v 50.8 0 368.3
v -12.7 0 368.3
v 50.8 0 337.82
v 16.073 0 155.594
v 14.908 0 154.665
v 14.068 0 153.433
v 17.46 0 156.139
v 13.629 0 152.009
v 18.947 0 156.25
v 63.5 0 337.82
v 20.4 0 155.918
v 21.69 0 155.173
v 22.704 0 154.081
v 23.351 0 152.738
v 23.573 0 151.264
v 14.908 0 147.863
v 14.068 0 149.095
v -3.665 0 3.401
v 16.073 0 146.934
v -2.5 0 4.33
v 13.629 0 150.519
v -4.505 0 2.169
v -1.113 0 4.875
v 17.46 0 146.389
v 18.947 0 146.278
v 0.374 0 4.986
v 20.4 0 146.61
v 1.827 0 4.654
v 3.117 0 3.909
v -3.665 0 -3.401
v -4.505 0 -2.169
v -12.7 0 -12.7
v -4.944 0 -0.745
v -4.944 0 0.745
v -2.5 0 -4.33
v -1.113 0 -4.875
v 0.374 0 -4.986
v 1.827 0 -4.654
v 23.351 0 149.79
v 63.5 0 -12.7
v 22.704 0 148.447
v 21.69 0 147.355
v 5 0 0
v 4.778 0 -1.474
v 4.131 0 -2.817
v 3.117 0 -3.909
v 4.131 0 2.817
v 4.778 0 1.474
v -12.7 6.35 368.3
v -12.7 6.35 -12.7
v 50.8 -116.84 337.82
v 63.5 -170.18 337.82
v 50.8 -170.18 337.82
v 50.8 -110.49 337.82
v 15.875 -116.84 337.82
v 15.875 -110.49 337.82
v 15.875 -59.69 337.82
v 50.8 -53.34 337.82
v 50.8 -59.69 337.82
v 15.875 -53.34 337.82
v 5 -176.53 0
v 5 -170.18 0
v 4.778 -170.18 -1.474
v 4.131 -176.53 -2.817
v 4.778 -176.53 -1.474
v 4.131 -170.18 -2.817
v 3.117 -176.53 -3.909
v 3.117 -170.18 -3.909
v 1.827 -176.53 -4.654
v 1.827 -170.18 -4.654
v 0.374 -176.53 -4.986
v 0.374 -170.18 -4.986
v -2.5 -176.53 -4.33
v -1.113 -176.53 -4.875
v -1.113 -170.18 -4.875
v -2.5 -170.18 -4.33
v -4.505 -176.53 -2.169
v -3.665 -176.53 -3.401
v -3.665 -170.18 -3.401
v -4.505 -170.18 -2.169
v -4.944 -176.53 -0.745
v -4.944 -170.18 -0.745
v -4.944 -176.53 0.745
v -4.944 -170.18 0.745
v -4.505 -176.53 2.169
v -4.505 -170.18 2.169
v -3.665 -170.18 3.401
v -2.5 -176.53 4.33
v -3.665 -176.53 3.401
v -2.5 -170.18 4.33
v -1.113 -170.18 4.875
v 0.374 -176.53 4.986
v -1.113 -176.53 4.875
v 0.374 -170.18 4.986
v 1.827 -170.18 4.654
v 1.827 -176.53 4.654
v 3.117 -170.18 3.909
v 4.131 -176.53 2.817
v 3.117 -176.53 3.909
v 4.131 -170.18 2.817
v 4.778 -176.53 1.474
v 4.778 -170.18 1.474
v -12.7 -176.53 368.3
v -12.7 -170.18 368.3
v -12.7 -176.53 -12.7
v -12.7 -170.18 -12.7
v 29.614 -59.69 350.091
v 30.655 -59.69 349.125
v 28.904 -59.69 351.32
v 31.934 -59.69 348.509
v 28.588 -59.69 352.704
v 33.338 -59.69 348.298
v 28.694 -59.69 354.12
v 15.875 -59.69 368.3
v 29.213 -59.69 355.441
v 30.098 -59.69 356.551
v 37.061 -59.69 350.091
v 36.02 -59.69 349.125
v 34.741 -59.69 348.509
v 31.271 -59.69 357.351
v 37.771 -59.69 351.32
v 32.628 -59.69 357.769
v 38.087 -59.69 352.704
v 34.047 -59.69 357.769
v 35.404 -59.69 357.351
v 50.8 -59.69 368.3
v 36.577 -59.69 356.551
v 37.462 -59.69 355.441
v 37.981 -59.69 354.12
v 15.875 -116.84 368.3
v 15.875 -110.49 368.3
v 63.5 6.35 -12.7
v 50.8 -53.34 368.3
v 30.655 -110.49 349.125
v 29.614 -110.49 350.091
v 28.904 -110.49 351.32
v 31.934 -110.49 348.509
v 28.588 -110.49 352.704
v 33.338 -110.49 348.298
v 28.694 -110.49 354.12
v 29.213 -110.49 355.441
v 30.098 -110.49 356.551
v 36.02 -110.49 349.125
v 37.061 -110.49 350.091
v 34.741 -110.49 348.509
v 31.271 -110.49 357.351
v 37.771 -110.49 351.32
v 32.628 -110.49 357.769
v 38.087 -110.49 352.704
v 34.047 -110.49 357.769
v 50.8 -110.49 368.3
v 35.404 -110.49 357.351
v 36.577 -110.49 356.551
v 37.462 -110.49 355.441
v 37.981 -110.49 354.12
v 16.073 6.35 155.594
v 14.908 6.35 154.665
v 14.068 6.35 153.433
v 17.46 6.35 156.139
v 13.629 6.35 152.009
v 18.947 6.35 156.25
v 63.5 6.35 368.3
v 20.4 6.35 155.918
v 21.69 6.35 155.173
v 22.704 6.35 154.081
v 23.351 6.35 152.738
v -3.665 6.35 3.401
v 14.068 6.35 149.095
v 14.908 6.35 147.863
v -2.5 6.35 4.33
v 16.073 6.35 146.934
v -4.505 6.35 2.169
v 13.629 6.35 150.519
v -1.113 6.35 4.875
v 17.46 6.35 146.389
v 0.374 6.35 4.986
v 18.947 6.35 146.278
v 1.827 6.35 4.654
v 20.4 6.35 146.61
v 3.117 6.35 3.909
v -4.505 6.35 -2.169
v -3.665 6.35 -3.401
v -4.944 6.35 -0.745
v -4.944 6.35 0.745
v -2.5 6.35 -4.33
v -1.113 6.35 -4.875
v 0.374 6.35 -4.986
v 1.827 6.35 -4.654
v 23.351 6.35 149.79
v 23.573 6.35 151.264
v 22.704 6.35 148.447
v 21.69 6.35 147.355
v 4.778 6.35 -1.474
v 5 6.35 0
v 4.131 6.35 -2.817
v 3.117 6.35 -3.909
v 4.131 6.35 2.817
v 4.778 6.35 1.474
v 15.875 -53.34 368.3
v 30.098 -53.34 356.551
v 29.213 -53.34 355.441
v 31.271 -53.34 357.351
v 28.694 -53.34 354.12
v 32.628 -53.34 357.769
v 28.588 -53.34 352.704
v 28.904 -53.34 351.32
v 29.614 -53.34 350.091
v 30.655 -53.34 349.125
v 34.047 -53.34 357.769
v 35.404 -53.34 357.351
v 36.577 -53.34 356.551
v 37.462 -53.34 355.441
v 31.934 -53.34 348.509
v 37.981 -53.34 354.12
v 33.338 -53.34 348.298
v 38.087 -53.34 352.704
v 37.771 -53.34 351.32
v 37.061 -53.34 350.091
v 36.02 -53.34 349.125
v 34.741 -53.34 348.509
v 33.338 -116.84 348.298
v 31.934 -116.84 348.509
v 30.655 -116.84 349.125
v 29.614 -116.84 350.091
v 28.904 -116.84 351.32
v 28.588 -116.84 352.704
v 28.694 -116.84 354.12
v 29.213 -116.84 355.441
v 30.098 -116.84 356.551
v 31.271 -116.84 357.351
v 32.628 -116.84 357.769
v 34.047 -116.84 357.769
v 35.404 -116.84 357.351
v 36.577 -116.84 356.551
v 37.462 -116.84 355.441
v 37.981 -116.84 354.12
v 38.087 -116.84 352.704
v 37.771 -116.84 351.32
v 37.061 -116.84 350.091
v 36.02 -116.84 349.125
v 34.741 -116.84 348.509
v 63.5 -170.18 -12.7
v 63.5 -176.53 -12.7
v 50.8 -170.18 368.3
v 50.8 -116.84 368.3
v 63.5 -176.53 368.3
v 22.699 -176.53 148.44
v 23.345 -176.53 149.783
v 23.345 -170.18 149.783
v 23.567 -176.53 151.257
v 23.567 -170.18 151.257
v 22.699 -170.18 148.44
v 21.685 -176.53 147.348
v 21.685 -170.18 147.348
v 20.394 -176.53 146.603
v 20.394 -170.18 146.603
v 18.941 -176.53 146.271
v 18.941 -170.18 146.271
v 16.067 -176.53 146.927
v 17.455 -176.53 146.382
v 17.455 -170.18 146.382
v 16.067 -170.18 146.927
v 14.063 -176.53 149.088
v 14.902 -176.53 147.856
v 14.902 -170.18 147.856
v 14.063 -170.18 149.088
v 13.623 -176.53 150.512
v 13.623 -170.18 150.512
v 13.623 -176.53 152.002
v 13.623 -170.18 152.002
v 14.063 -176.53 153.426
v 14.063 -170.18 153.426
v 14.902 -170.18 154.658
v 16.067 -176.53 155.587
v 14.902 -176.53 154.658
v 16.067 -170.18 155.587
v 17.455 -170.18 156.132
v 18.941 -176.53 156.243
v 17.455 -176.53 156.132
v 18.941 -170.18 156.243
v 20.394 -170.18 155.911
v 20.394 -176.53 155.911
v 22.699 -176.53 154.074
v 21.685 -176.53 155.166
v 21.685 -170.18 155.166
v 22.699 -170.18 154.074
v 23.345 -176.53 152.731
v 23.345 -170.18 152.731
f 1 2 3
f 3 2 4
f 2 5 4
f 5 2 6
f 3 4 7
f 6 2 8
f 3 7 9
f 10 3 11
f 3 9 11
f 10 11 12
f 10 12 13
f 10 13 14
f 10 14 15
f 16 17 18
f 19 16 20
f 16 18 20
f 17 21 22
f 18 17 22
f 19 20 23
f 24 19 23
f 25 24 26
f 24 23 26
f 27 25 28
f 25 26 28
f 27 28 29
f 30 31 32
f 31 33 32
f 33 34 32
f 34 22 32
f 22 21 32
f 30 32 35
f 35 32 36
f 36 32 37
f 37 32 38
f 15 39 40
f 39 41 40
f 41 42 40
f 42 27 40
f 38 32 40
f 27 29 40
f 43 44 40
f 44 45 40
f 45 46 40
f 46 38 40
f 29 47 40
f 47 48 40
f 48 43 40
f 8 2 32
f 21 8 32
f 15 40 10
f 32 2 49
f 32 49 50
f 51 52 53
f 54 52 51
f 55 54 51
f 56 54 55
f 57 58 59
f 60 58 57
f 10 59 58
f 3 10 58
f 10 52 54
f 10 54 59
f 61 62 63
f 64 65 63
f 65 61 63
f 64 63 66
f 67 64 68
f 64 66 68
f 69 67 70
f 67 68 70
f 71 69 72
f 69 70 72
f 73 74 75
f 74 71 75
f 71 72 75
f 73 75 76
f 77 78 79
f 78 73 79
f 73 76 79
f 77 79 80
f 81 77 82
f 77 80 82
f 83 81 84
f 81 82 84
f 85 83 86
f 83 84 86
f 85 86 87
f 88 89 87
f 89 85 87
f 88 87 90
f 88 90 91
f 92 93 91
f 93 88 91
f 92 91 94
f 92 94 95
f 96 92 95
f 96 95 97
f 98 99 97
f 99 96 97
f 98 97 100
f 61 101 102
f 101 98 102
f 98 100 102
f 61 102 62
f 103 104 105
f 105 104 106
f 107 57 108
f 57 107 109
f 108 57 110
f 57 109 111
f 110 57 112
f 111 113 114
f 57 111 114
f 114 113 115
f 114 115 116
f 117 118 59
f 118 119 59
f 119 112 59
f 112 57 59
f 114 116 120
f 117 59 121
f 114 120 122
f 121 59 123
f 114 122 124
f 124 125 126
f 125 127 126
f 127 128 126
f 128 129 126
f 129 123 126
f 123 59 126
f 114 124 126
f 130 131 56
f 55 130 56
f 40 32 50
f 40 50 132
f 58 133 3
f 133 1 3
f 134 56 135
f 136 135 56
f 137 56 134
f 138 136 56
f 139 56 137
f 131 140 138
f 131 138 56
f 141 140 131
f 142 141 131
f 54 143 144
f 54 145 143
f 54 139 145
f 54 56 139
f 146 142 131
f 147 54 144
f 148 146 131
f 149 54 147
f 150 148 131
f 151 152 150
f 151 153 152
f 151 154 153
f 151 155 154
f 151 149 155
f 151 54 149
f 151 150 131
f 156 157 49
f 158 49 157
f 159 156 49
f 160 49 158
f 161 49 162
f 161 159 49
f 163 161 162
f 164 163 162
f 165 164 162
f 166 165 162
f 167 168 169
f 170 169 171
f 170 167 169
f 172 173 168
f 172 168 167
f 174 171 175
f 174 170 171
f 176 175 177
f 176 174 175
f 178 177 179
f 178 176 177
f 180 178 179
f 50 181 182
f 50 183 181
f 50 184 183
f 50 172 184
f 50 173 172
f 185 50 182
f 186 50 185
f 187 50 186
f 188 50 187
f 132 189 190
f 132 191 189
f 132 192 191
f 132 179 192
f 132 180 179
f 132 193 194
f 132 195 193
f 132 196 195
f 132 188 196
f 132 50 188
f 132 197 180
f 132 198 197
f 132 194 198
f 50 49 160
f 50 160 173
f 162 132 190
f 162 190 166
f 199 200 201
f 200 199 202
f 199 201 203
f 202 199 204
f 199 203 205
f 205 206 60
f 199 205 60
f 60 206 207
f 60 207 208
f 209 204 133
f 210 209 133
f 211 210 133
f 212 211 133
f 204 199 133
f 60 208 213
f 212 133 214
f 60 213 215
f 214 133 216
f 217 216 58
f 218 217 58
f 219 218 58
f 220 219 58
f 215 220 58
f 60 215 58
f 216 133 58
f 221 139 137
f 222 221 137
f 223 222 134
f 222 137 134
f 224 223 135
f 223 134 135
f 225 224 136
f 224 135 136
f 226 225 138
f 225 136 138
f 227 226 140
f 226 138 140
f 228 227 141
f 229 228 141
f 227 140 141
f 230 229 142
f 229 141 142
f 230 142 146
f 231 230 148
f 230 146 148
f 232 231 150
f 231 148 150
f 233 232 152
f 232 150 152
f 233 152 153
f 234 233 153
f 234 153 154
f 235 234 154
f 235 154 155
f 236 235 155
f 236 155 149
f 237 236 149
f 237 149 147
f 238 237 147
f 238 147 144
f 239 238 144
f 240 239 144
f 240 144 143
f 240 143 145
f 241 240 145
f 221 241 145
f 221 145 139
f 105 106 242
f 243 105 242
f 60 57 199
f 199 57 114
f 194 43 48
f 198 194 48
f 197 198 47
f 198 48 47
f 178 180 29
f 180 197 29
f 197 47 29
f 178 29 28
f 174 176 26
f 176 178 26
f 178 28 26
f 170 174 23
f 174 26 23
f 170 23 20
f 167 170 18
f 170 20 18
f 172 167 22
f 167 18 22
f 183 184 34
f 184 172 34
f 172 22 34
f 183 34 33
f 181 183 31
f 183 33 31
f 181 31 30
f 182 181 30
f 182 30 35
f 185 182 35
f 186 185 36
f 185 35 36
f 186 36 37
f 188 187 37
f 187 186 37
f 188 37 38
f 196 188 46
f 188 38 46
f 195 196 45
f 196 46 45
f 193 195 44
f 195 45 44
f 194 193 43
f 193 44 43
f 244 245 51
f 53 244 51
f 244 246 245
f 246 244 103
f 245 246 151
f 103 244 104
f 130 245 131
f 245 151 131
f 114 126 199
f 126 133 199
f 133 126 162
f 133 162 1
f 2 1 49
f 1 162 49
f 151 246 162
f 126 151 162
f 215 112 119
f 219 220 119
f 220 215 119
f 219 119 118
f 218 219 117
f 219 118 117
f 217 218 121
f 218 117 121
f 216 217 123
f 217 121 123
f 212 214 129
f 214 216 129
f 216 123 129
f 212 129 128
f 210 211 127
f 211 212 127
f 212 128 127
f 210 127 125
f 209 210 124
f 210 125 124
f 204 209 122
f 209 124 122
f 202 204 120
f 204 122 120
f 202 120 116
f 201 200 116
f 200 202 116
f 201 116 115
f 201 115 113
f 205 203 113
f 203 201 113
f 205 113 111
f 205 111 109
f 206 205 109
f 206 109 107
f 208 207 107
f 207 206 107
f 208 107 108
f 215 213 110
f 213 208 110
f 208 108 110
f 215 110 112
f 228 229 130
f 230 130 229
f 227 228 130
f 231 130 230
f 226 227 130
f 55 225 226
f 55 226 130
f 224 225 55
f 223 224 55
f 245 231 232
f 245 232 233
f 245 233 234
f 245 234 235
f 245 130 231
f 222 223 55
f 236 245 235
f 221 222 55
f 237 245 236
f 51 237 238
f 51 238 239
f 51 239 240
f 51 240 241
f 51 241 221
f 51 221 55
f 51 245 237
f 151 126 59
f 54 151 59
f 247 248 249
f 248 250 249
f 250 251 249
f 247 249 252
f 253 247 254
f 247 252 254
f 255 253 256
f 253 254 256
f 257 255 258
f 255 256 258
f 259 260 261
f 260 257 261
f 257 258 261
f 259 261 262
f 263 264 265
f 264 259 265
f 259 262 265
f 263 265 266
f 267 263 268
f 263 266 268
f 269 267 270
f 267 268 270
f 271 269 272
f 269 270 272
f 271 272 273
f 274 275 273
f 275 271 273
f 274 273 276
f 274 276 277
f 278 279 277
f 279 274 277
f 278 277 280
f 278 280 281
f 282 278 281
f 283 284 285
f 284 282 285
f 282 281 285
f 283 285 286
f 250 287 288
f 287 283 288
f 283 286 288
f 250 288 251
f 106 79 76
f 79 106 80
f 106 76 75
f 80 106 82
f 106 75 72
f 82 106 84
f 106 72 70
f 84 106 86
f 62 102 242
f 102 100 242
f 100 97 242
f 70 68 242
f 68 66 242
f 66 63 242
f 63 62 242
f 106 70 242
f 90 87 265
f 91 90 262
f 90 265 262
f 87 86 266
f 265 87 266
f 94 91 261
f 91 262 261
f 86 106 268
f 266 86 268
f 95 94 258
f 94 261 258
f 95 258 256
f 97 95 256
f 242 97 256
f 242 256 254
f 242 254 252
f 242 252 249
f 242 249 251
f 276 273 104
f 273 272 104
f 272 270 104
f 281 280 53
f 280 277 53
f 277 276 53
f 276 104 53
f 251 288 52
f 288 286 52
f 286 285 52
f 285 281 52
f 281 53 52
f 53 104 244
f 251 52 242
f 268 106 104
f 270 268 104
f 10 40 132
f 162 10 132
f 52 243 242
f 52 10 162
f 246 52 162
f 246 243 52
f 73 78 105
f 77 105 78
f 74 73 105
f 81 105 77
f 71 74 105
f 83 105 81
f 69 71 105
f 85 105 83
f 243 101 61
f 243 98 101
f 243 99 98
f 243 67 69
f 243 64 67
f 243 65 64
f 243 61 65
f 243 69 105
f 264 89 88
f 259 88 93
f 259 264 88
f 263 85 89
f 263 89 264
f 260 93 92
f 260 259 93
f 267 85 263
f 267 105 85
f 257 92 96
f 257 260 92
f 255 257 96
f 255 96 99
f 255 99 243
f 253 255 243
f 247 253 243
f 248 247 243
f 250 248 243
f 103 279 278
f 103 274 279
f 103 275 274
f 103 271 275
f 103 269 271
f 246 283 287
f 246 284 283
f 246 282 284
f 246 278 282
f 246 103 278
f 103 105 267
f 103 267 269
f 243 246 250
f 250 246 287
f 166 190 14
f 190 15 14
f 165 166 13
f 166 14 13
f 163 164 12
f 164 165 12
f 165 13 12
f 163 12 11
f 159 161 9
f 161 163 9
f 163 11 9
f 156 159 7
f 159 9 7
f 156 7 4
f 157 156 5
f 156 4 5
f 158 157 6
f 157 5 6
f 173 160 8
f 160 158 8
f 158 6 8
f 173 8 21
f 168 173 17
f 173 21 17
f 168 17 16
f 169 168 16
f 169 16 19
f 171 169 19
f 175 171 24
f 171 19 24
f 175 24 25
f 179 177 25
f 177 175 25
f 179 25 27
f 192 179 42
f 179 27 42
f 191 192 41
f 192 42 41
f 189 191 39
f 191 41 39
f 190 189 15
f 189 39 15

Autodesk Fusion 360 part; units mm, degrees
sketch "Sketch1" plane through (0, 0, 0) normal (0, 1, 0) x (1, 0, 0)
  line L0 (0, 0) -> (18.5729, 0) construction
  line L1 (18.5729, 0) -> (18.5729, -151.264) construction
  line L2 (18.5729, -151.264) -> (0, -151.264) construction
  line L3 (0, -151.264) -> (0, 0) construction
  line L4 (0, 0) -> (18.5729, -151.264) construction
  line L5 (0, 0) -> (43.3367, -352.9494) construction
  line L6 (-12.7, 12.7) -> (63.5, 12.7)
  line L7 (63.5, 12.7) -> (63.5, -368.3)
  line L8 (63.5, -368.3) -> (-12.7, -368.3)
  line L9 (-12.7, -368.3) -> (-12.7, 12.7)
  circle A0 centre (0, 0) radius 5
  circle A1 centre (18.5729, -151.264) radius 5
  circle A2 centre (43.3367, -352.9494) radius 4.7625
  line L10 (63.5, -368.3) -> (50.8, -368.3)
  line L11 (50.8, -368.3) -> (50.8, -337.82)
  line L12 (50.8, -337.82) -> (63.5, -337.82)
  line L13 (63.5, -337.82) -> (63.5, -368.3)
  line L14 (50.8, -353.06) -> (63.5, -353.06)
  dimension "d7" = 18.5729
  dimension "d8" = 151.264
  dimension "d9" = 355.6
  dimension "d10" = 381
  dimension "d11" = 76.2
  dimension "d13" = 12.7
  dimension "d14" = 12.7
  dimension "d15" = 10
  dimension "d16" = 10
  dimension "d19" = 9.525
  dimension "d22" = 30.48
  dimension "d23" = 12.7
extrude "Extrude1" add sketch "Sketch1" along normal blind 5.08 contours L6 L7 L8 L9 L11 L12 | L7 L11 L12 L13 L14 | L7 L8 L10 L11 L13 L14 | A2
extrude "Extrude3" add sketch "Sketch1" against normal blind 170.18 contours L7 L11 L12 L13 L14 | L7 L8 L10 L11 L13 L14
sketch "Sketch2" plane through (50.8, 0, 0) normal (-1, 0, 0) x (0, -1, 0)
  line L0 (0, 368.3) -> (0, 337.82)
  line L1 (0, 337.82) -> (170.18, 337.82)
  line L2 (170.18, 337.82) -> (170.18, 368.3)
  line L3 (170.18, 368.3) -> (0, 368.3)
  line L4 (85.09, 337.82) -> (85.09, 368.3)
  line L5 (170.18, 353.06) -> (0, 353.06)
  line L6 (59.69, 348.2975) -> (110.49, 348.2975) construction
  line L7 (110.49, 348.2975) -> (110.49, 357.8225) construction
  line L8 (110.49, 357.8225) -> (59.69, 357.8225) construction
  line L9 (59.69, 357.8225) -> (59.69, 348.2975) construction
  line L10 (59.69, 353.06) -> (110.49, 353.06)
  line L11 (85.09, 357.8225) -> (85.09, 348.2975)
  line L12 (110.49, 368.3) -> (115.57, 368.3)
  line L13 (115.57, 368.3) -> (115.57, 337.82)
  line L14 (115.57, 337.82) -> (110.49, 337.82)
  line L15 (110.49, 337.82) -> (110.49, 368.3)
  line L16 (54.61, 368.3) -> (54.61, 337.82)
  line L17 (59.69, 337.82) -> (59.69, 368.3)
  line L18 (59.69, 368.3) -> (54.61, 368.3)
  line L19 (54.61, 337.82) -> (59.69, 337.82)
  dimension "d26" = 9.525
  dimension "d27" = 50.8
  dimension "d28" = 30.48
  dimension "d29" = 85.09
  dimension "d30" = 5.08
  dimension "d31" = 5.08
  dimension "d32" = 30.48
extrude "Extrude4" add sketch "Sketch2" along normal blind 34.925 contours L3 L5 L16 L17 L18 | L1 L5 L16 L17 L19 | L3 L5 L12 L13 L15 | L1 L5 L13 L14 L15
hole "Hole1" at (33.3375, -59.69, 353.06) direction (0, 1, 0) diameter 9.525 depth 10.16 tip angle 118
hole "Hole2" at (33.3375, -115.57, 353.06) direction (0, 1, 0) diameter 9.525 depth 10.16 tip angle 118
sketch "Sketch3" plane through (0, -170.18, 0) normal (0, -1, 0) x (1, 0, 0)
  line L0 (50.8, 337.82) -> (63.5, 337.82)
  line L1 (63.5, 337.82) -> (63.5, 368.3)
  line L2 (63.5, 368.3) -> (50.8, 368.3)
  line L3 (50.8, 368.3) -> (50.8, 337.82)
  line L4 (63.5, 368.3) -> (-12.7, 368.3)
  line L5 (-12.7, 368.3) -> (-12.7, -12.7)
  line L6 (-12.7, -12.7) -> (63.5, -12.7)
  line L7 (63.5, -12.7) -> (63.5, 368.3)
  line L8 (0, 0) -> (18.5674, 0) construction
  line L9 (18.5674, 0) -> (18.5674, 151.257) construction
  line L10 (18.5674, 151.257) -> (0, 151.257) construction
  line L11 (0, 151.257) -> (0, 0) construction
  circle A0 centre (0, 0) radius 5
  line L12 (0, 0) -> (18.5674, 151.257) construction
  line L13 (0, 0) -> (43.3261, 352.9507) construction
  circle A1 centre (43.3261, 352.9507) radius 4.7625
  circle A2 centre (18.5674, 151.257) radius 5
  dimension "d41" = 381
  dimension "d42" = 76.2
  dimension "d43" = 151.257
  dimension "d44" = 18.5674
  dimension "d45" = 10
  dimension "d46" = 355.6
  dimension "d47" = 9.525
  dimension "d48" = 10
extrude "Extrude5" add 1 faces at (23.1881, 5.08, 297.6201) along direction (0, 1, 0) blind 1.27
extrude "Extrude6" add 1 faces at (20.1128, -54.61, 353.1786) along direction (0, 1, 0) blind 1.27
extrude "Extrude7" add 1 faces at (20.1128, -115.57, 353.1786) along direction (0, -1, 0) blind 1.27
extrude "Extrude8" add sketch "Sketch3" along normal blind 6.35 contours L0 L1 L2 L3 L4 L7 | L0 L3 L4 L5 L6 L7 | A1
equation "d19 = ( 3 / 8 ) * 1 in"
equation "d26 = ( 3 / 8 ) * 1 in"
